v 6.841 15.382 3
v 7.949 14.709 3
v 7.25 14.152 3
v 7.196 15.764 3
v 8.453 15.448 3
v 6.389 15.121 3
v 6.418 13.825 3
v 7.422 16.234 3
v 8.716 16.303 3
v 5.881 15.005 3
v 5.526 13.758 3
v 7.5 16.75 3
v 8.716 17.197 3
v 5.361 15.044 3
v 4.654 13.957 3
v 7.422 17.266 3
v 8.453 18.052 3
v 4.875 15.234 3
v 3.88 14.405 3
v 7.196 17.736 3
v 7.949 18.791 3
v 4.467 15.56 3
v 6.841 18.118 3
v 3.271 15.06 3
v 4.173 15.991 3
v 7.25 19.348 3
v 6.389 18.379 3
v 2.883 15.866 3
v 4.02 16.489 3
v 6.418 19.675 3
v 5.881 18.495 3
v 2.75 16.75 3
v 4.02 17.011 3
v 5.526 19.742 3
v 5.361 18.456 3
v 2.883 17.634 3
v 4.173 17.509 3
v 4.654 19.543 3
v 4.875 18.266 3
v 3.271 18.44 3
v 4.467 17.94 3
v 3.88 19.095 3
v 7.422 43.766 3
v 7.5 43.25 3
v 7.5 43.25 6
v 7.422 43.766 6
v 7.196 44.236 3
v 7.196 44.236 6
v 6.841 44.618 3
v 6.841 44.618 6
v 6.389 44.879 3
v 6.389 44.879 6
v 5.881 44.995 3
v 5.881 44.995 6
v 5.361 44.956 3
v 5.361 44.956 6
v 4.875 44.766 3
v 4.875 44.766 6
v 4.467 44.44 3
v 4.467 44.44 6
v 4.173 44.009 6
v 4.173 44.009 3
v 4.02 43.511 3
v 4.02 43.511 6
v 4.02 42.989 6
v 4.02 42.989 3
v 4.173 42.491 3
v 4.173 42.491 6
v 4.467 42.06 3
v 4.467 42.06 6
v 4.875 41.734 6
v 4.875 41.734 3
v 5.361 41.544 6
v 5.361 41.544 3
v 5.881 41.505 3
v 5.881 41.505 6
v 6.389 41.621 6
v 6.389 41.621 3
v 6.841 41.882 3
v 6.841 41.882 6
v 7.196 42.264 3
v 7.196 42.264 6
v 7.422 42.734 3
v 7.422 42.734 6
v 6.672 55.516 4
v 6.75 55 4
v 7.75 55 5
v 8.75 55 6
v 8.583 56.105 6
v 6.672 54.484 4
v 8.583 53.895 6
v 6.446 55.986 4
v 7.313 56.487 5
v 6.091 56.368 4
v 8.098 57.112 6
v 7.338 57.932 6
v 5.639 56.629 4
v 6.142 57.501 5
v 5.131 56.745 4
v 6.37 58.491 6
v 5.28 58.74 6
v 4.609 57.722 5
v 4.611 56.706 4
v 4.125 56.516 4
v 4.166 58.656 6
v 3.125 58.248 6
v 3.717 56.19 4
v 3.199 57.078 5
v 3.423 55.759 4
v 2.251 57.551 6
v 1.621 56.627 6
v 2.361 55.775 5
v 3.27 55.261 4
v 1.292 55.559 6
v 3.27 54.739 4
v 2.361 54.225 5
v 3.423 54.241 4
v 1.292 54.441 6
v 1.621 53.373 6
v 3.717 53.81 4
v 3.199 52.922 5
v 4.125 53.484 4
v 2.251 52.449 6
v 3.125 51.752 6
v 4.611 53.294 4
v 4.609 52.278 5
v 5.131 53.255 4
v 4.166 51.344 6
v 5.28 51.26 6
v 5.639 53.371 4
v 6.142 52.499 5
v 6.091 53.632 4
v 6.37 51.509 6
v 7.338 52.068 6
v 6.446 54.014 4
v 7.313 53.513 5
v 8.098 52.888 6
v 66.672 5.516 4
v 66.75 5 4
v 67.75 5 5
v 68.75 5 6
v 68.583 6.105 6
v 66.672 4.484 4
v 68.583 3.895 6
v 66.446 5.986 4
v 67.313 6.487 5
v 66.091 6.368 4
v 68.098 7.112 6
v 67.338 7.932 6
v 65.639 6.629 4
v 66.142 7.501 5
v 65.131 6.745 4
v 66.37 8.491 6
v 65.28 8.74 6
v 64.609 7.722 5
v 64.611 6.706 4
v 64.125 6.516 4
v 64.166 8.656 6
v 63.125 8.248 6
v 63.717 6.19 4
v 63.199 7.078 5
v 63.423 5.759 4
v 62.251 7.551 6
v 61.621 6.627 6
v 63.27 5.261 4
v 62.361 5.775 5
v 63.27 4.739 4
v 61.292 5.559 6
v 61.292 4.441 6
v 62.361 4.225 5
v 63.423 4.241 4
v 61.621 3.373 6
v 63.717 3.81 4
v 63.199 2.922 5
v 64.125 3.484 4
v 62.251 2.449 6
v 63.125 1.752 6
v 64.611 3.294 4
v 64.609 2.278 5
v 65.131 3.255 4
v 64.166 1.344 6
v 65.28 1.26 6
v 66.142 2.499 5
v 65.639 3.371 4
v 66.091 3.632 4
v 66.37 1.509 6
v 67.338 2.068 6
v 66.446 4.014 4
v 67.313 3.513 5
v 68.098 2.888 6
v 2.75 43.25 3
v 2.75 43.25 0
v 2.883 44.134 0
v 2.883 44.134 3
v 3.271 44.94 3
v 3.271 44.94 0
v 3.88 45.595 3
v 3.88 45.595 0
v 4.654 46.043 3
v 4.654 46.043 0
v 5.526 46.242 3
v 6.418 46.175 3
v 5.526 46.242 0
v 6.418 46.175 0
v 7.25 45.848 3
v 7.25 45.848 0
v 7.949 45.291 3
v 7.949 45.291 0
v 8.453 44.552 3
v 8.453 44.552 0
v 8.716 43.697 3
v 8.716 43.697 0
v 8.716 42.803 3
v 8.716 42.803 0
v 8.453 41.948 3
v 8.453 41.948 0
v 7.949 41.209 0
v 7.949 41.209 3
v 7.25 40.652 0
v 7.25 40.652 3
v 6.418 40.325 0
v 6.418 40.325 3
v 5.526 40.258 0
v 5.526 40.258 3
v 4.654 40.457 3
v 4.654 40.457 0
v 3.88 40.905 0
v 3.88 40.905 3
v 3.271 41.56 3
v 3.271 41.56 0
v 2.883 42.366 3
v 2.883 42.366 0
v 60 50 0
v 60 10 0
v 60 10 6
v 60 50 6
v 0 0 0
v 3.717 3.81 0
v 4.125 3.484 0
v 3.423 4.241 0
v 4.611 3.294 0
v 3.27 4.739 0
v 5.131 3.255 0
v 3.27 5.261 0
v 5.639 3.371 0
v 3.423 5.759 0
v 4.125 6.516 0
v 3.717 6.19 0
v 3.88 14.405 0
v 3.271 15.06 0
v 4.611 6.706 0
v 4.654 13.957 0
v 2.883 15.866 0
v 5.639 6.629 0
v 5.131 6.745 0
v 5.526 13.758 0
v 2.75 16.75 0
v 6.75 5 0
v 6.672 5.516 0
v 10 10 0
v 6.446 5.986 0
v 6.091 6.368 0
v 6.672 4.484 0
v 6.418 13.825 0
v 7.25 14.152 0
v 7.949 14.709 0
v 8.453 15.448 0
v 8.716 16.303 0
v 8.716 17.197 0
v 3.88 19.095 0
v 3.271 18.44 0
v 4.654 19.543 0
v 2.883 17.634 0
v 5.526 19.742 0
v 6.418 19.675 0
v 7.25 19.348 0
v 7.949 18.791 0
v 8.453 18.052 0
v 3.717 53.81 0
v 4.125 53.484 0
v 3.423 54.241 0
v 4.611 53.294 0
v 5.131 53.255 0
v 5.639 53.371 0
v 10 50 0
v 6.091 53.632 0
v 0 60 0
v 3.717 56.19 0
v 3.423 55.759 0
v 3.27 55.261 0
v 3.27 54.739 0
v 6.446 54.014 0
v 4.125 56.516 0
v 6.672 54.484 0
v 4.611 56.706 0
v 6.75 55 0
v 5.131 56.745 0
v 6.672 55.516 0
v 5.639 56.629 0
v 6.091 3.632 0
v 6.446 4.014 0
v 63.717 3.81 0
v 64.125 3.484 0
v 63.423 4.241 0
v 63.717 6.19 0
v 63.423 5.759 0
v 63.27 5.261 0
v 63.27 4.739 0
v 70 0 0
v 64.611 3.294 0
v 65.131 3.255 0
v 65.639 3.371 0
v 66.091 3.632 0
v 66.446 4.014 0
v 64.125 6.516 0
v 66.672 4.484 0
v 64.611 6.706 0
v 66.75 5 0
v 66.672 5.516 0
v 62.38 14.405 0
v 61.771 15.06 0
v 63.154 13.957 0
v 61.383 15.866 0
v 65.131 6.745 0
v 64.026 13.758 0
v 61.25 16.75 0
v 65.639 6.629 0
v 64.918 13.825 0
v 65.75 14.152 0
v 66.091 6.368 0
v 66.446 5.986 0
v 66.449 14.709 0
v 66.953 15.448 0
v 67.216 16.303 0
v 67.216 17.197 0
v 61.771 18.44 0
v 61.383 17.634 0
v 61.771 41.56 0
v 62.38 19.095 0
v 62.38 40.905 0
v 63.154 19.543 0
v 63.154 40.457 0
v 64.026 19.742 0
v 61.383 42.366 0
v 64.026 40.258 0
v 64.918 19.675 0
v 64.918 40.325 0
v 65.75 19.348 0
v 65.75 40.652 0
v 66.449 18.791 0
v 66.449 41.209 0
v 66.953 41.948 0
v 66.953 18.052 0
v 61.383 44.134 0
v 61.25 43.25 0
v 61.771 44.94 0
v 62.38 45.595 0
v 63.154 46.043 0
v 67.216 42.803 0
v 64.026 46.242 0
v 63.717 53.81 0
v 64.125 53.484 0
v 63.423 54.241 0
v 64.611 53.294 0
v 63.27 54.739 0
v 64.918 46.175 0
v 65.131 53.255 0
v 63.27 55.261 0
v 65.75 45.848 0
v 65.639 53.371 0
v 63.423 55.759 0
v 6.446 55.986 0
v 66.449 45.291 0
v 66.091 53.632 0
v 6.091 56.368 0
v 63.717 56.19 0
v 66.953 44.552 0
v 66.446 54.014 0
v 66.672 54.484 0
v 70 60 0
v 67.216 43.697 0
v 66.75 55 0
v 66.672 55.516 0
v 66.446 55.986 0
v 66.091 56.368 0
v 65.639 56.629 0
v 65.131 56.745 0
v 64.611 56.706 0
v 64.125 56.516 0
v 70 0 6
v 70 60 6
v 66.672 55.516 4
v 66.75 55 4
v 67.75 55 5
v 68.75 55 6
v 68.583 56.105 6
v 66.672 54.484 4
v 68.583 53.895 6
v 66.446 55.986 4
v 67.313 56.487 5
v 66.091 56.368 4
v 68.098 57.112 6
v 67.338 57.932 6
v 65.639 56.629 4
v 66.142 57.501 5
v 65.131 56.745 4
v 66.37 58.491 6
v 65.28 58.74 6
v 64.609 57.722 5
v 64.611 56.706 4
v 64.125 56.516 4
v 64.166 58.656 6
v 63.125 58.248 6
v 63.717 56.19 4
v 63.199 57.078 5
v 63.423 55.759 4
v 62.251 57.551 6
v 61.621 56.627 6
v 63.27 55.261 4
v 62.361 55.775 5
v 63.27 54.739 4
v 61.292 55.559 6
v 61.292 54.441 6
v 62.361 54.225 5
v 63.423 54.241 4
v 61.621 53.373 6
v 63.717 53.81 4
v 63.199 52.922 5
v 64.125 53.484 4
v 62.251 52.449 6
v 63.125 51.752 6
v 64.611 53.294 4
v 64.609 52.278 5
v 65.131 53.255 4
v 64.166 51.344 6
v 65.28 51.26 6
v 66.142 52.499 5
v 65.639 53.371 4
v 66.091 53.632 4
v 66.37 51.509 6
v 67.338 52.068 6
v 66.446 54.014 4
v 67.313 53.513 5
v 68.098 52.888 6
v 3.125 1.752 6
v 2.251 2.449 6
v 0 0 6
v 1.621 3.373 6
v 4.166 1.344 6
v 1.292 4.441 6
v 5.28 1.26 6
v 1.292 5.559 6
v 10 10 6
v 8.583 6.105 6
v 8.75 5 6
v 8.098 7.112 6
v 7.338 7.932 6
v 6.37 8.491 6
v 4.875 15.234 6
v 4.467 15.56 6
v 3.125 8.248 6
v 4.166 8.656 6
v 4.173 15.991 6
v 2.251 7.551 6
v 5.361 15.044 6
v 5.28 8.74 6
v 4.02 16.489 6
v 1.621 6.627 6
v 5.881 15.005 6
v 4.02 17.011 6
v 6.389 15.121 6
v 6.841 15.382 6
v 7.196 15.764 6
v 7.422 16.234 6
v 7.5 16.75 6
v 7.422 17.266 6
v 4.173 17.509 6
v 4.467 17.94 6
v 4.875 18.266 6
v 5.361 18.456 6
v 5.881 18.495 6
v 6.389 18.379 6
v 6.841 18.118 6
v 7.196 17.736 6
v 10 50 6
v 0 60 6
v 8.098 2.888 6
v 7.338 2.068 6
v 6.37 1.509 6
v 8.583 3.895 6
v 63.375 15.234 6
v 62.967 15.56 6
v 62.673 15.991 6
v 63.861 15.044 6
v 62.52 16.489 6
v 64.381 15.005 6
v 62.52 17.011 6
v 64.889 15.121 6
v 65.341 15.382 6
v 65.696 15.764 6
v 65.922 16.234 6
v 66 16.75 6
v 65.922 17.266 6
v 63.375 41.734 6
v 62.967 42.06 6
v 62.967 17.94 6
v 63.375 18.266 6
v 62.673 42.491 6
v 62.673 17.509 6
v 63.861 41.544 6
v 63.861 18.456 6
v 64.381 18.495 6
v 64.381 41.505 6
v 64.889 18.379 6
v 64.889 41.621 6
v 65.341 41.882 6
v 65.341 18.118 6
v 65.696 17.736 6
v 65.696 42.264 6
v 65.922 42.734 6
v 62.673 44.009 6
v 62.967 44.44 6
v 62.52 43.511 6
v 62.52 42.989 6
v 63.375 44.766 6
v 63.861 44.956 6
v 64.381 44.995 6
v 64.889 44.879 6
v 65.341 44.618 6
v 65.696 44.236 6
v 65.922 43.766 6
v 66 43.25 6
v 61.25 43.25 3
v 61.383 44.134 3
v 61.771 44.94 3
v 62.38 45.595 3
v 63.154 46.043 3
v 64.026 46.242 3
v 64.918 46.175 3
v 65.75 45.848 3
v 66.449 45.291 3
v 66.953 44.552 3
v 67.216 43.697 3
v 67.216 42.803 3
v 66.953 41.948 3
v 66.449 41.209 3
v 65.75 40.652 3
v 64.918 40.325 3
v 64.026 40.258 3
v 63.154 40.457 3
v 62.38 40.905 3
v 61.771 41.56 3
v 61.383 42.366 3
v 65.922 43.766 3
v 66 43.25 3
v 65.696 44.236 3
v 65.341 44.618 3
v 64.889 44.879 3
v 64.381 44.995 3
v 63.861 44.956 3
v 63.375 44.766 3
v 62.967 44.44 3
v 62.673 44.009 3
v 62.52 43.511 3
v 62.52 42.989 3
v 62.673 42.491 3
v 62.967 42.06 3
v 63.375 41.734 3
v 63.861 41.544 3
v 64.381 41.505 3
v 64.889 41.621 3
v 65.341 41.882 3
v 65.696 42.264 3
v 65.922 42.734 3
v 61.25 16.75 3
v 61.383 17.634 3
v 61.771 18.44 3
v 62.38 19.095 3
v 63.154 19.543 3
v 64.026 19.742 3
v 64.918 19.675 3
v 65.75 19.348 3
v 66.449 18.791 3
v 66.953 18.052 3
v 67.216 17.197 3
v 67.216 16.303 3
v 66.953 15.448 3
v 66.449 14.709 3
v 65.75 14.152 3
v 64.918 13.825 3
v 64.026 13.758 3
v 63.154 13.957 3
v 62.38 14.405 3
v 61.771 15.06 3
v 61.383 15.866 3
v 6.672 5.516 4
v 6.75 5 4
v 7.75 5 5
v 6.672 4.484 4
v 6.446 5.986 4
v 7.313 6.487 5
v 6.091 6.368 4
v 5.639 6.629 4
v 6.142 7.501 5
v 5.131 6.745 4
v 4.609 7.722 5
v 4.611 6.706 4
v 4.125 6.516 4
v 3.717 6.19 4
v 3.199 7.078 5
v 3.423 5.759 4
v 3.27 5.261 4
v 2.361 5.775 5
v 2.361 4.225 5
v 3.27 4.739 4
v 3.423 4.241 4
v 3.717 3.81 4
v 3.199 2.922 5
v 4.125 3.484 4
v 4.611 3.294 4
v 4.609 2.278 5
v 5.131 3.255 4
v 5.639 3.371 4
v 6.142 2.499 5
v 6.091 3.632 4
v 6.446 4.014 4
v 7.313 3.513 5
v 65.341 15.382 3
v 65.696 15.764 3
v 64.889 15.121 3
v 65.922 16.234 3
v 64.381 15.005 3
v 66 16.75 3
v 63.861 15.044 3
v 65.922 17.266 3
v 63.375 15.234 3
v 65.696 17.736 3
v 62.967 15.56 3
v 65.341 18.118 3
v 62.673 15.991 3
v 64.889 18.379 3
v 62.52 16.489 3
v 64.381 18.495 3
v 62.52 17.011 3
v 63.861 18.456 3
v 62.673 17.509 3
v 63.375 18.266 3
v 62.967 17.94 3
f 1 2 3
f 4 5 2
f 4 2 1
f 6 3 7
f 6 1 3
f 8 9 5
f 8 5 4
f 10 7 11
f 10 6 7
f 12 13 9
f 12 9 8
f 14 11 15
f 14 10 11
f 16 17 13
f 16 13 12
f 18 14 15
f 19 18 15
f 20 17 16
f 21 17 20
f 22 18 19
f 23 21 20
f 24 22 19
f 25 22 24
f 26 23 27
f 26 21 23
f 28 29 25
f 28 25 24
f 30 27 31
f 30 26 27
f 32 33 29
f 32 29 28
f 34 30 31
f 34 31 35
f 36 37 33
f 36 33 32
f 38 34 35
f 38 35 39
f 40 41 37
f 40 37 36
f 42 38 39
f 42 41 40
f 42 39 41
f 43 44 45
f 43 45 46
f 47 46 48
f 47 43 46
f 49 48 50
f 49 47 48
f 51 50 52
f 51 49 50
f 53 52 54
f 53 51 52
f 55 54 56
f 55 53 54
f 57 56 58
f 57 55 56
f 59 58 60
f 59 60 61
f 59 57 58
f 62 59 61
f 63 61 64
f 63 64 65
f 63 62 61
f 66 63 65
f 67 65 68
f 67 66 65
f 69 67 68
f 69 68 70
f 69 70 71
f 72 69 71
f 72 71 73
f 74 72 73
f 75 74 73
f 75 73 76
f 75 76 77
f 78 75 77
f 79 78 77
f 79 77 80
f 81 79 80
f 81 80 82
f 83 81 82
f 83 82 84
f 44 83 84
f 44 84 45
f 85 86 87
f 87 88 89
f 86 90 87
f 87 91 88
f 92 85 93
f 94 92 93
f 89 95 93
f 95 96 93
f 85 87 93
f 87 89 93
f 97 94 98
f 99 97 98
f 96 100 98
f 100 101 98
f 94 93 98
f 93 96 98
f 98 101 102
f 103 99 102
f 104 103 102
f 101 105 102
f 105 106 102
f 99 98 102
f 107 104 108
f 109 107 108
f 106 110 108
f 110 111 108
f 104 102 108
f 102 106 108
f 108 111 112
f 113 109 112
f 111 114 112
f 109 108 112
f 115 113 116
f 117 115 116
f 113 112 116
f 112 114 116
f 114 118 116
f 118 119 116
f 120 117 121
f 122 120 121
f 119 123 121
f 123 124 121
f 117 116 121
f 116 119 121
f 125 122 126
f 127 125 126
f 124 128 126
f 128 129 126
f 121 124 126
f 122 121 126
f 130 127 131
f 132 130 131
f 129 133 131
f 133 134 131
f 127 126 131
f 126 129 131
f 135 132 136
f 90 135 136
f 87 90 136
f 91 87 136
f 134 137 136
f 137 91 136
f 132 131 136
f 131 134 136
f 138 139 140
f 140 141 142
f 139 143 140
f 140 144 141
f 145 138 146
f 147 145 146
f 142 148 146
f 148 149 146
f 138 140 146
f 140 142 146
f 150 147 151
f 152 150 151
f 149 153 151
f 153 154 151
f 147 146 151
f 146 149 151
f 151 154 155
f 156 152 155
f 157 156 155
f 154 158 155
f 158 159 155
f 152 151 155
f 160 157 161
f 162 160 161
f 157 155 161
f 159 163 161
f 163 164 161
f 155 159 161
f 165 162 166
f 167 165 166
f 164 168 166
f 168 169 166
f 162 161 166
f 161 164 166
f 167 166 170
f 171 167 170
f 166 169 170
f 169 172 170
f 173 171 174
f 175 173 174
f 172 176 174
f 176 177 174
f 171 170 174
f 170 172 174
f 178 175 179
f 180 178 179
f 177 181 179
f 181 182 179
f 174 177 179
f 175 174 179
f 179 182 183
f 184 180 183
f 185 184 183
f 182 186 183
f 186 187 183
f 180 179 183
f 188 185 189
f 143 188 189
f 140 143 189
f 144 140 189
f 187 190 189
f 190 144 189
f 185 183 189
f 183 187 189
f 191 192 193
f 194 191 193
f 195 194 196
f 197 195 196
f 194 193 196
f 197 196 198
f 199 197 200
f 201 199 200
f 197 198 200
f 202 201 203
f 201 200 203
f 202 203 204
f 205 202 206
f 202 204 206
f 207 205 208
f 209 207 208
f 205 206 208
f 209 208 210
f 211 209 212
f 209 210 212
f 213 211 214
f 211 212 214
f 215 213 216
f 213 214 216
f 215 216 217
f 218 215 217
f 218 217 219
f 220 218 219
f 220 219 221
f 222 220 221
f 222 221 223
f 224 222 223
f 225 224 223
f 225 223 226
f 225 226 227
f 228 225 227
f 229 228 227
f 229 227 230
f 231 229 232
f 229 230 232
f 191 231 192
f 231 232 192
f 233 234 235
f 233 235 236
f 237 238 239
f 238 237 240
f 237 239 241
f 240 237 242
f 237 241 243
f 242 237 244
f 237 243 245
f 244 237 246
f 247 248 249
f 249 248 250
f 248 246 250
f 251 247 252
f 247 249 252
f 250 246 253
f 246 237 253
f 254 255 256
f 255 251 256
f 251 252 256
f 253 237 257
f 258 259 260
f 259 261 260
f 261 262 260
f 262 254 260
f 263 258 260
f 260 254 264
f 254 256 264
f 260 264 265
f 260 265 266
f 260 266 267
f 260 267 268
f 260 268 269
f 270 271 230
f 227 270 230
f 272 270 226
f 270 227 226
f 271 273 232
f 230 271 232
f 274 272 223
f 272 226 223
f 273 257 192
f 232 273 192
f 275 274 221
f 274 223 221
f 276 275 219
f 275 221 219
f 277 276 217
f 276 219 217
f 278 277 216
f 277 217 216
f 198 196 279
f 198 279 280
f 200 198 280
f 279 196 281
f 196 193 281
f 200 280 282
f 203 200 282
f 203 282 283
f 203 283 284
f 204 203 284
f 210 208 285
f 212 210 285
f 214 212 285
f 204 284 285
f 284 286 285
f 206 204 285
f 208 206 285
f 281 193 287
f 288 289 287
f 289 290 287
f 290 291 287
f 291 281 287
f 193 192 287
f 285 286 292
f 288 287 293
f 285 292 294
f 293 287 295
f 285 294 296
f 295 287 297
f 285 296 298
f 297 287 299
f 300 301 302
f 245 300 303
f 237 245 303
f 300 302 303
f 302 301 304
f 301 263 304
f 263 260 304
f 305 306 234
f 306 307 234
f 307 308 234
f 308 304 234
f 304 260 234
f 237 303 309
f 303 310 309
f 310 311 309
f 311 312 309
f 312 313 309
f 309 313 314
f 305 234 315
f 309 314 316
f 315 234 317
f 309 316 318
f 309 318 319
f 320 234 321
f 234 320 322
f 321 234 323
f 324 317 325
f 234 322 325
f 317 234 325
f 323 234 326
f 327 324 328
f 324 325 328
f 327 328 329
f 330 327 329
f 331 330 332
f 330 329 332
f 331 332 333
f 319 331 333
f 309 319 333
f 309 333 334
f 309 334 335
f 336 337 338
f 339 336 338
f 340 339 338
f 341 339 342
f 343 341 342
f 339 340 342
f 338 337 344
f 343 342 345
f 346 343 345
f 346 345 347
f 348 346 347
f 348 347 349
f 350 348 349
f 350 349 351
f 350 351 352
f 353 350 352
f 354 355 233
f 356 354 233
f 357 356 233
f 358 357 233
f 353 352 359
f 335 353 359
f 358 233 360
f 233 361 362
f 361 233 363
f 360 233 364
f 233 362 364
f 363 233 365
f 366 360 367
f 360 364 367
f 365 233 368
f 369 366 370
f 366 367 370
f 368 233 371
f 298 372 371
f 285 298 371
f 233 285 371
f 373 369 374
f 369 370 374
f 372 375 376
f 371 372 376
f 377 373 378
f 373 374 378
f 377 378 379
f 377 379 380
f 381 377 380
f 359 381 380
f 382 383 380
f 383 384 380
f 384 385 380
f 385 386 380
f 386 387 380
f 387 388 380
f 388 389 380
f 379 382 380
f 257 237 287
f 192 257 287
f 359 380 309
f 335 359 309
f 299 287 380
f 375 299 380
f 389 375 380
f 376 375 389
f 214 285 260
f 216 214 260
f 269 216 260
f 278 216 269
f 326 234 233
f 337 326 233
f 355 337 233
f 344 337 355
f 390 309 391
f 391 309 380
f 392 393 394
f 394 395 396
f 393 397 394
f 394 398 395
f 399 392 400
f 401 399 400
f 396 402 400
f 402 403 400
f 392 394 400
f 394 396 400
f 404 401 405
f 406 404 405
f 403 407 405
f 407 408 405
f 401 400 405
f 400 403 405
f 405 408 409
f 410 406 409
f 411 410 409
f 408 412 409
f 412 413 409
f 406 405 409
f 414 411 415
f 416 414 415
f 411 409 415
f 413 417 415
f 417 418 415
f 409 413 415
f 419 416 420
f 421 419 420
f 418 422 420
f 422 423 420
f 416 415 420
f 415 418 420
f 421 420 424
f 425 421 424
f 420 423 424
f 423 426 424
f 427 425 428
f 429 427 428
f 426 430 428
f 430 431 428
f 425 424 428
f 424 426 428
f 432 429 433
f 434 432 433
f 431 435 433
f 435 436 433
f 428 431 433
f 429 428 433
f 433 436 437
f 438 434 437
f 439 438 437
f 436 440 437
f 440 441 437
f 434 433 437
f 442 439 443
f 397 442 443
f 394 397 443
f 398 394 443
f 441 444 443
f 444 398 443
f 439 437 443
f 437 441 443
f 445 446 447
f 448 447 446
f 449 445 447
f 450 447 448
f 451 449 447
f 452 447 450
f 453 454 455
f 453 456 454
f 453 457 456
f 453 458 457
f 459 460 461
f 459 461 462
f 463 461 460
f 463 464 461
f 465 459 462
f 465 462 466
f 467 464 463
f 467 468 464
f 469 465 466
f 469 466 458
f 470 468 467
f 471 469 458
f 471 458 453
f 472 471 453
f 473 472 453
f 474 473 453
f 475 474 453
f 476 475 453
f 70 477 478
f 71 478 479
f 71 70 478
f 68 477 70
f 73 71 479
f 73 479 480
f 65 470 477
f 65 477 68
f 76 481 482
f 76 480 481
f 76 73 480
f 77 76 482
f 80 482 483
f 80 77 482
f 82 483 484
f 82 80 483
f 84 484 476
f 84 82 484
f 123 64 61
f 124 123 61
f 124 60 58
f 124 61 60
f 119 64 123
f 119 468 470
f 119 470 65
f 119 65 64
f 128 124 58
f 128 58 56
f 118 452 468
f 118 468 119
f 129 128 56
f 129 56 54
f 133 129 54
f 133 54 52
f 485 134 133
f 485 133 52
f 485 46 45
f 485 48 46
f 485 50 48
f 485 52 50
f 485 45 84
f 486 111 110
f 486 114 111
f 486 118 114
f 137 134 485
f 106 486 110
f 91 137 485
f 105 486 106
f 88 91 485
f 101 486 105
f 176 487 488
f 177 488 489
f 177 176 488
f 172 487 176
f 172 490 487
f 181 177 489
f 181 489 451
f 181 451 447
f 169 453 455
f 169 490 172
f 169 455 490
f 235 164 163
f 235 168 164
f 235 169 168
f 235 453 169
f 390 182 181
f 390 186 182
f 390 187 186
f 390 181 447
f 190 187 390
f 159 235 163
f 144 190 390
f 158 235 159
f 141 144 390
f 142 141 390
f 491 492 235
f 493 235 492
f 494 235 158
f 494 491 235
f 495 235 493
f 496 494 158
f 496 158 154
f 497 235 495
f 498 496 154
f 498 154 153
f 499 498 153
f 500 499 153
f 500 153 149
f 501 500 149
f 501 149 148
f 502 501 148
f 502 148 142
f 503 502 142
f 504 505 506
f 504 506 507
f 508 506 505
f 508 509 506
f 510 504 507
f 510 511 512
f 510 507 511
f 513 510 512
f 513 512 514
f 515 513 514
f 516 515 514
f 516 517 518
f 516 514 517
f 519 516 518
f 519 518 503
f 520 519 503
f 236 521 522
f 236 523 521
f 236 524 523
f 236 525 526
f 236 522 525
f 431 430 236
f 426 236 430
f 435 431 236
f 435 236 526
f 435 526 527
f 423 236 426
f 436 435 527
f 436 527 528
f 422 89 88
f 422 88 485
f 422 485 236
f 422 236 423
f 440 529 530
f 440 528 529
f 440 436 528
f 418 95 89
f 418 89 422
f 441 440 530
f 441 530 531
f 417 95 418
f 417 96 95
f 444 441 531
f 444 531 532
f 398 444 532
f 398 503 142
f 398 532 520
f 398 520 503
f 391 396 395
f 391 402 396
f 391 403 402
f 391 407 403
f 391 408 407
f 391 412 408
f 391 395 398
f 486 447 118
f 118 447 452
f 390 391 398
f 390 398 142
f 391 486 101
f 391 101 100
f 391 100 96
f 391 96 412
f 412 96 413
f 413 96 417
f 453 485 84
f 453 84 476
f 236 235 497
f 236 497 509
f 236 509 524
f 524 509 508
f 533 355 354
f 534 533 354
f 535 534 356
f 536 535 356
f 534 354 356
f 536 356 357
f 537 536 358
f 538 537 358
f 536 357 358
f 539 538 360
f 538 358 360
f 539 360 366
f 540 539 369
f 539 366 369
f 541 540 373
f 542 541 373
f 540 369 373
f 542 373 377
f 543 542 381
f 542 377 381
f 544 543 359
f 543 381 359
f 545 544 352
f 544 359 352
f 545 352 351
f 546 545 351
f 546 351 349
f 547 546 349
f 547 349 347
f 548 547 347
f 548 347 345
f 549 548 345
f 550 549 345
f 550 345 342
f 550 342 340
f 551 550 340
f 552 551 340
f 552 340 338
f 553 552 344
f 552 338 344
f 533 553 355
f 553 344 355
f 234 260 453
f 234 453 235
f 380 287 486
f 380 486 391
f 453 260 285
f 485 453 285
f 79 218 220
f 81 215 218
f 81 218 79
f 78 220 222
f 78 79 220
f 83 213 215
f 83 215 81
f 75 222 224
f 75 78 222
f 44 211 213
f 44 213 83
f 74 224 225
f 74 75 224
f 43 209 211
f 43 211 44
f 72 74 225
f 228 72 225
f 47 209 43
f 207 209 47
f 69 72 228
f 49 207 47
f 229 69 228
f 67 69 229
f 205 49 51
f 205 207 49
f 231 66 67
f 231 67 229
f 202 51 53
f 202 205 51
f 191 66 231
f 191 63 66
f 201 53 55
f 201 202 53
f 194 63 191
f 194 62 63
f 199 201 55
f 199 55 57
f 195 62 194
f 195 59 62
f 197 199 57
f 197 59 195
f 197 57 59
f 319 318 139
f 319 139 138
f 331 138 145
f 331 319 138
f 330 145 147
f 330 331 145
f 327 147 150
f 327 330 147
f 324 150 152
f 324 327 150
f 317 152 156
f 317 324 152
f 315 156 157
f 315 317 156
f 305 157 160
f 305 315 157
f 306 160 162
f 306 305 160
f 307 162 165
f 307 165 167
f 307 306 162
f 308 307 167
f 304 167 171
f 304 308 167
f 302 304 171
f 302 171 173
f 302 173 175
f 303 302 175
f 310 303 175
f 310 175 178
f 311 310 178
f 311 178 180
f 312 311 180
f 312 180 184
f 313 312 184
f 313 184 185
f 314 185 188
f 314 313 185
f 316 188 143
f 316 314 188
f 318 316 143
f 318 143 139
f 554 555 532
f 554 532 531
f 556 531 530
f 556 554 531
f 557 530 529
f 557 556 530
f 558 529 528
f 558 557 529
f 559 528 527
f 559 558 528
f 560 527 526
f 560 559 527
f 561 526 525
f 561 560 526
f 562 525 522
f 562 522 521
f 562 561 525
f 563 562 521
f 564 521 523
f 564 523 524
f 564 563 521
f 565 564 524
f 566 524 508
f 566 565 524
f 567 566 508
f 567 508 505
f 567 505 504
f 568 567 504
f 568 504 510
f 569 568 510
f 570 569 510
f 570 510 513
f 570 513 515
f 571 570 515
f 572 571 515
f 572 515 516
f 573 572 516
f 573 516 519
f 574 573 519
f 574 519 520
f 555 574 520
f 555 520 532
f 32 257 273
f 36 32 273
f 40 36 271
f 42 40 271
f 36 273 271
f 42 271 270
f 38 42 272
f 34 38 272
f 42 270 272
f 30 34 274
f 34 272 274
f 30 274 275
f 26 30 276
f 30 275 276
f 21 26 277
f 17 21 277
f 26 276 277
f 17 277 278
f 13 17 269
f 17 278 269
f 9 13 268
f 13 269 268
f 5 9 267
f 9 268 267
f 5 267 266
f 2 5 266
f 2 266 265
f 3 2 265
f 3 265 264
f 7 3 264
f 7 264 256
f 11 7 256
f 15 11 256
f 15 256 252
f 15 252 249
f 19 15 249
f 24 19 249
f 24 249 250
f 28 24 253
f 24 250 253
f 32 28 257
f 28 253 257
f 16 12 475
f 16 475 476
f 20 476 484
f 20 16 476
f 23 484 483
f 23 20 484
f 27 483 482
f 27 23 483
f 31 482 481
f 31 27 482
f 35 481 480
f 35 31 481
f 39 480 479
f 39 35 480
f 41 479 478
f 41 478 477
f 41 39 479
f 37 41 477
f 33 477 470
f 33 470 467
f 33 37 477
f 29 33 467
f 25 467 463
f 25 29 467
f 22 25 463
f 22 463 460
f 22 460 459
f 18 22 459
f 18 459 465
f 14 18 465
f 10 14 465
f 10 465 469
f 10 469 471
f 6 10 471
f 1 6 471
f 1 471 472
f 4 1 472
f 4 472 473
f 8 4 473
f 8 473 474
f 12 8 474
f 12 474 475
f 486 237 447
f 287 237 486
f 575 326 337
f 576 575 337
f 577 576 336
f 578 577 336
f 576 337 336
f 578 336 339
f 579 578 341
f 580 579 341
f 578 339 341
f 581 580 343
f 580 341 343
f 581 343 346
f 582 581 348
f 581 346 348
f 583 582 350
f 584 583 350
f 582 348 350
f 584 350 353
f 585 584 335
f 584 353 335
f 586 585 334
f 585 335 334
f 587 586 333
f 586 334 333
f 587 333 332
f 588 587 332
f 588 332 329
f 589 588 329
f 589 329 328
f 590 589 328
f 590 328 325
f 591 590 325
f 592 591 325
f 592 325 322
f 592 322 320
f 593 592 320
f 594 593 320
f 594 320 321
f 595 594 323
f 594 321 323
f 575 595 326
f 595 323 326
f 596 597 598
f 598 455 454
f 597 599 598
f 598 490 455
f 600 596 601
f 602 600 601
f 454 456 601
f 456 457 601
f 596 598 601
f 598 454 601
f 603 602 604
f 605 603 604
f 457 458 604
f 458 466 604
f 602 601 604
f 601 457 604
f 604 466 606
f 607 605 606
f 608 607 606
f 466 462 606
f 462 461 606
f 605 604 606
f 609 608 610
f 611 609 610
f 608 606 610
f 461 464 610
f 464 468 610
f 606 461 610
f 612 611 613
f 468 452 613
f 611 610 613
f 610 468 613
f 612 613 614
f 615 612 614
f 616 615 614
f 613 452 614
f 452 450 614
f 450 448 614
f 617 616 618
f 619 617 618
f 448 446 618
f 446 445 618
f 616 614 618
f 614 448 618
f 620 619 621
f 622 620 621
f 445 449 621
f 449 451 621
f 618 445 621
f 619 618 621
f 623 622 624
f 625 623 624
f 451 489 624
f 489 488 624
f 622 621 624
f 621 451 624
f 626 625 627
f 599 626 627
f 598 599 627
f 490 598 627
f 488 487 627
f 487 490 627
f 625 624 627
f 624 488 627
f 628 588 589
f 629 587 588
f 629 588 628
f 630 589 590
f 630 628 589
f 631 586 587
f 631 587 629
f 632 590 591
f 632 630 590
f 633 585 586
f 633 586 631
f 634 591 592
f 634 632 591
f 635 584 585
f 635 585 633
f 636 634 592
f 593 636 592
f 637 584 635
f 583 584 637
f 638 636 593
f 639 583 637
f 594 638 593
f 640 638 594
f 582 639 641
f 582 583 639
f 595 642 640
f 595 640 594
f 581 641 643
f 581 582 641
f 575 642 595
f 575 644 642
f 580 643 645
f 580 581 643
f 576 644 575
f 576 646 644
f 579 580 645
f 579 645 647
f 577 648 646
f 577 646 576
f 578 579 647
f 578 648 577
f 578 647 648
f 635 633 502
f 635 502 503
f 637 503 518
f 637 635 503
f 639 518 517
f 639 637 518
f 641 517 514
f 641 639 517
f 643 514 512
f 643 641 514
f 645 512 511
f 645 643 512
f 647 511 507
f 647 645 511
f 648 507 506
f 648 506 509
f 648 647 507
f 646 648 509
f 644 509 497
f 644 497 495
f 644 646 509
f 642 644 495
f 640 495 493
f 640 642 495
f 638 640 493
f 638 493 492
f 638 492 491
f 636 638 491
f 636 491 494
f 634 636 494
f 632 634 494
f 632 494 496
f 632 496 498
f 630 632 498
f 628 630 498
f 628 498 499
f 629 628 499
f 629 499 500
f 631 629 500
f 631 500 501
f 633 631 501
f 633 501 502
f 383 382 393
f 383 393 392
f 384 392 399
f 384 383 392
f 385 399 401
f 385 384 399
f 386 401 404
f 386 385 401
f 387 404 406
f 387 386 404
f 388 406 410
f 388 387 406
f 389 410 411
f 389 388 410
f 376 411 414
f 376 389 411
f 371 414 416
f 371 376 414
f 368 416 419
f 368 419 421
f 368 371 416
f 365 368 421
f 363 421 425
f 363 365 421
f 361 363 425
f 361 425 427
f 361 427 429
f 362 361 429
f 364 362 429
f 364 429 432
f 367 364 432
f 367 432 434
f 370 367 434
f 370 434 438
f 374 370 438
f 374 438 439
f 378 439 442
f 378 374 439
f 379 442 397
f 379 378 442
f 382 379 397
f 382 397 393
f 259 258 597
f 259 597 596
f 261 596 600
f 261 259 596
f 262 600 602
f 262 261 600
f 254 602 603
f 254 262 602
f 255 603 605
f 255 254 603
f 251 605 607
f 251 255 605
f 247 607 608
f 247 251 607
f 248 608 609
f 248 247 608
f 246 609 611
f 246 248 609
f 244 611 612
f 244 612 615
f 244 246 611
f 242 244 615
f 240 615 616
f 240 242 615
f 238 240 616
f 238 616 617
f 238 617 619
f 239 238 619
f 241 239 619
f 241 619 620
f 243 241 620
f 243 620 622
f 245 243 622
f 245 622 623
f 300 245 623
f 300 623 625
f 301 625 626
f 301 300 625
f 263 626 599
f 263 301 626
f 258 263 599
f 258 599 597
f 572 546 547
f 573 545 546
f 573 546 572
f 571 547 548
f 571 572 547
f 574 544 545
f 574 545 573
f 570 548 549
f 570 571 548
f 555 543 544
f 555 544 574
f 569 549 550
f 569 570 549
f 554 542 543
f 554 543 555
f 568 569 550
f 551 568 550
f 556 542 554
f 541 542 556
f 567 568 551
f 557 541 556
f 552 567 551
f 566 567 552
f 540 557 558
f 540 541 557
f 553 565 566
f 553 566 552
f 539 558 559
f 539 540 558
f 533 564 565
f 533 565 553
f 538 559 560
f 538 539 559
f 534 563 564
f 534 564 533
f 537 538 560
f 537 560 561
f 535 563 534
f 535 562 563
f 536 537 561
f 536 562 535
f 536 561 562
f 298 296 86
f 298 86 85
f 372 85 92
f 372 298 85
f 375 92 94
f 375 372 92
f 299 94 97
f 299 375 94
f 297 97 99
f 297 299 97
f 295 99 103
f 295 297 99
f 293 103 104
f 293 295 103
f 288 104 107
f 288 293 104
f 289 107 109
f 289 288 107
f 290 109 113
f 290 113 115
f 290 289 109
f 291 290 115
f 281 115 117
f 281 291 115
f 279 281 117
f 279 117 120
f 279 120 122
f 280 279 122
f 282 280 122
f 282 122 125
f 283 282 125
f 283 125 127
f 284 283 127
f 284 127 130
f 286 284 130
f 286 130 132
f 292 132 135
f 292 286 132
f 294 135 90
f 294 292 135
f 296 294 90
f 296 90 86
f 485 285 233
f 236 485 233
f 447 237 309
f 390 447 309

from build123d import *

# Parameters (mm, degrees)
SKETCH1_W           = 70
SKETCH1_H           = 60
SKETCH1_R           = 1.75
SKETCH1_W_2         = 50
SKETCH1_H_2         = 40
BOSS_EXTRUDE1_DEPTH = 6
CHAMFER1_SIZE       = 2
SKETCH3_R           = 3
CUT_EXTRUDE1_DEPTH  = 3


with BuildPart() as part:
    # Sketch1 → Boss-Extrude1 (new body)
    with BuildSketch(Plane.XY):
        with Locations((35, 30)):
            Rectangle(SKETCH1_W, SKETCH1_H)
        with Locations((5.75, 16.75)):
            Circle(SKETCH1_R, mode=Mode.SUBTRACT)
        with Locations((5.75, 43.25)):
            Circle(SKETCH1_R, mode=Mode.SUBTRACT)
        with Locations((64.25, 43.25)):
            Circle(SKETCH1_R, mode=Mode.SUBTRACT)
        with Locations((64.25, 16.75)):
            Circle(SKETCH1_R, mode=Mode.SUBTRACT)
        with Locations((5, 55)):
            Circle(SKETCH1_R, mode=Mode.SUBTRACT)
        with Locations((65, 55)):
            Circle(SKETCH1_R, mode=Mode.SUBTRACT)
        with Locations((65, 5)):
            Circle(SKETCH1_R, mode=Mode.SUBTRACT)
        with Locations((5, 5)):
            Circle(SKETCH1_R, mode=Mode.SUBTRACT)
        with Locations((35, 30)):
            Rectangle(SKETCH1_W_2, SKETCH1_H_2, mode=Mode.SUBTRACT)
    extrude(amount=BOSS_EXTRUDE1_DEPTH)

    # Chamfer1
    chamfer1_edges = [part.edges().sort_by_distance(p)[0] for p in [
        (3.25, 55, 6),
        (63.25, 55, 6),
        (63.25, 5, 6),
        (3.25, 5, 6),
    ]]
    chamfer(chamfer1_edges, length=CHAMFER1_SIZE)

    # Sketch3 → Cut-Extrude1 (cut)
    with BuildSketch(Plane(origin=(0, 0, 0), x_dir=(-1, 0, 0), z_dir=(0, 0, -1))):
        with Locations((-64.25, 43.25)):
            Circle(SKETCH3_R)
        with Locations((-64.25, 16.75)):
            Circle(SKETCH3_R)
        with Locations((-5.75, 16.75)):
            Circle(SKETCH3_R)
        with Locations((-5.75, 43.25)):
            Circle(SKETCH3_R)
    extrude(amount=-CUT_EXTRUDE1_DEPTH, mode=Mode.SUBTRACT)


solid = part.part
